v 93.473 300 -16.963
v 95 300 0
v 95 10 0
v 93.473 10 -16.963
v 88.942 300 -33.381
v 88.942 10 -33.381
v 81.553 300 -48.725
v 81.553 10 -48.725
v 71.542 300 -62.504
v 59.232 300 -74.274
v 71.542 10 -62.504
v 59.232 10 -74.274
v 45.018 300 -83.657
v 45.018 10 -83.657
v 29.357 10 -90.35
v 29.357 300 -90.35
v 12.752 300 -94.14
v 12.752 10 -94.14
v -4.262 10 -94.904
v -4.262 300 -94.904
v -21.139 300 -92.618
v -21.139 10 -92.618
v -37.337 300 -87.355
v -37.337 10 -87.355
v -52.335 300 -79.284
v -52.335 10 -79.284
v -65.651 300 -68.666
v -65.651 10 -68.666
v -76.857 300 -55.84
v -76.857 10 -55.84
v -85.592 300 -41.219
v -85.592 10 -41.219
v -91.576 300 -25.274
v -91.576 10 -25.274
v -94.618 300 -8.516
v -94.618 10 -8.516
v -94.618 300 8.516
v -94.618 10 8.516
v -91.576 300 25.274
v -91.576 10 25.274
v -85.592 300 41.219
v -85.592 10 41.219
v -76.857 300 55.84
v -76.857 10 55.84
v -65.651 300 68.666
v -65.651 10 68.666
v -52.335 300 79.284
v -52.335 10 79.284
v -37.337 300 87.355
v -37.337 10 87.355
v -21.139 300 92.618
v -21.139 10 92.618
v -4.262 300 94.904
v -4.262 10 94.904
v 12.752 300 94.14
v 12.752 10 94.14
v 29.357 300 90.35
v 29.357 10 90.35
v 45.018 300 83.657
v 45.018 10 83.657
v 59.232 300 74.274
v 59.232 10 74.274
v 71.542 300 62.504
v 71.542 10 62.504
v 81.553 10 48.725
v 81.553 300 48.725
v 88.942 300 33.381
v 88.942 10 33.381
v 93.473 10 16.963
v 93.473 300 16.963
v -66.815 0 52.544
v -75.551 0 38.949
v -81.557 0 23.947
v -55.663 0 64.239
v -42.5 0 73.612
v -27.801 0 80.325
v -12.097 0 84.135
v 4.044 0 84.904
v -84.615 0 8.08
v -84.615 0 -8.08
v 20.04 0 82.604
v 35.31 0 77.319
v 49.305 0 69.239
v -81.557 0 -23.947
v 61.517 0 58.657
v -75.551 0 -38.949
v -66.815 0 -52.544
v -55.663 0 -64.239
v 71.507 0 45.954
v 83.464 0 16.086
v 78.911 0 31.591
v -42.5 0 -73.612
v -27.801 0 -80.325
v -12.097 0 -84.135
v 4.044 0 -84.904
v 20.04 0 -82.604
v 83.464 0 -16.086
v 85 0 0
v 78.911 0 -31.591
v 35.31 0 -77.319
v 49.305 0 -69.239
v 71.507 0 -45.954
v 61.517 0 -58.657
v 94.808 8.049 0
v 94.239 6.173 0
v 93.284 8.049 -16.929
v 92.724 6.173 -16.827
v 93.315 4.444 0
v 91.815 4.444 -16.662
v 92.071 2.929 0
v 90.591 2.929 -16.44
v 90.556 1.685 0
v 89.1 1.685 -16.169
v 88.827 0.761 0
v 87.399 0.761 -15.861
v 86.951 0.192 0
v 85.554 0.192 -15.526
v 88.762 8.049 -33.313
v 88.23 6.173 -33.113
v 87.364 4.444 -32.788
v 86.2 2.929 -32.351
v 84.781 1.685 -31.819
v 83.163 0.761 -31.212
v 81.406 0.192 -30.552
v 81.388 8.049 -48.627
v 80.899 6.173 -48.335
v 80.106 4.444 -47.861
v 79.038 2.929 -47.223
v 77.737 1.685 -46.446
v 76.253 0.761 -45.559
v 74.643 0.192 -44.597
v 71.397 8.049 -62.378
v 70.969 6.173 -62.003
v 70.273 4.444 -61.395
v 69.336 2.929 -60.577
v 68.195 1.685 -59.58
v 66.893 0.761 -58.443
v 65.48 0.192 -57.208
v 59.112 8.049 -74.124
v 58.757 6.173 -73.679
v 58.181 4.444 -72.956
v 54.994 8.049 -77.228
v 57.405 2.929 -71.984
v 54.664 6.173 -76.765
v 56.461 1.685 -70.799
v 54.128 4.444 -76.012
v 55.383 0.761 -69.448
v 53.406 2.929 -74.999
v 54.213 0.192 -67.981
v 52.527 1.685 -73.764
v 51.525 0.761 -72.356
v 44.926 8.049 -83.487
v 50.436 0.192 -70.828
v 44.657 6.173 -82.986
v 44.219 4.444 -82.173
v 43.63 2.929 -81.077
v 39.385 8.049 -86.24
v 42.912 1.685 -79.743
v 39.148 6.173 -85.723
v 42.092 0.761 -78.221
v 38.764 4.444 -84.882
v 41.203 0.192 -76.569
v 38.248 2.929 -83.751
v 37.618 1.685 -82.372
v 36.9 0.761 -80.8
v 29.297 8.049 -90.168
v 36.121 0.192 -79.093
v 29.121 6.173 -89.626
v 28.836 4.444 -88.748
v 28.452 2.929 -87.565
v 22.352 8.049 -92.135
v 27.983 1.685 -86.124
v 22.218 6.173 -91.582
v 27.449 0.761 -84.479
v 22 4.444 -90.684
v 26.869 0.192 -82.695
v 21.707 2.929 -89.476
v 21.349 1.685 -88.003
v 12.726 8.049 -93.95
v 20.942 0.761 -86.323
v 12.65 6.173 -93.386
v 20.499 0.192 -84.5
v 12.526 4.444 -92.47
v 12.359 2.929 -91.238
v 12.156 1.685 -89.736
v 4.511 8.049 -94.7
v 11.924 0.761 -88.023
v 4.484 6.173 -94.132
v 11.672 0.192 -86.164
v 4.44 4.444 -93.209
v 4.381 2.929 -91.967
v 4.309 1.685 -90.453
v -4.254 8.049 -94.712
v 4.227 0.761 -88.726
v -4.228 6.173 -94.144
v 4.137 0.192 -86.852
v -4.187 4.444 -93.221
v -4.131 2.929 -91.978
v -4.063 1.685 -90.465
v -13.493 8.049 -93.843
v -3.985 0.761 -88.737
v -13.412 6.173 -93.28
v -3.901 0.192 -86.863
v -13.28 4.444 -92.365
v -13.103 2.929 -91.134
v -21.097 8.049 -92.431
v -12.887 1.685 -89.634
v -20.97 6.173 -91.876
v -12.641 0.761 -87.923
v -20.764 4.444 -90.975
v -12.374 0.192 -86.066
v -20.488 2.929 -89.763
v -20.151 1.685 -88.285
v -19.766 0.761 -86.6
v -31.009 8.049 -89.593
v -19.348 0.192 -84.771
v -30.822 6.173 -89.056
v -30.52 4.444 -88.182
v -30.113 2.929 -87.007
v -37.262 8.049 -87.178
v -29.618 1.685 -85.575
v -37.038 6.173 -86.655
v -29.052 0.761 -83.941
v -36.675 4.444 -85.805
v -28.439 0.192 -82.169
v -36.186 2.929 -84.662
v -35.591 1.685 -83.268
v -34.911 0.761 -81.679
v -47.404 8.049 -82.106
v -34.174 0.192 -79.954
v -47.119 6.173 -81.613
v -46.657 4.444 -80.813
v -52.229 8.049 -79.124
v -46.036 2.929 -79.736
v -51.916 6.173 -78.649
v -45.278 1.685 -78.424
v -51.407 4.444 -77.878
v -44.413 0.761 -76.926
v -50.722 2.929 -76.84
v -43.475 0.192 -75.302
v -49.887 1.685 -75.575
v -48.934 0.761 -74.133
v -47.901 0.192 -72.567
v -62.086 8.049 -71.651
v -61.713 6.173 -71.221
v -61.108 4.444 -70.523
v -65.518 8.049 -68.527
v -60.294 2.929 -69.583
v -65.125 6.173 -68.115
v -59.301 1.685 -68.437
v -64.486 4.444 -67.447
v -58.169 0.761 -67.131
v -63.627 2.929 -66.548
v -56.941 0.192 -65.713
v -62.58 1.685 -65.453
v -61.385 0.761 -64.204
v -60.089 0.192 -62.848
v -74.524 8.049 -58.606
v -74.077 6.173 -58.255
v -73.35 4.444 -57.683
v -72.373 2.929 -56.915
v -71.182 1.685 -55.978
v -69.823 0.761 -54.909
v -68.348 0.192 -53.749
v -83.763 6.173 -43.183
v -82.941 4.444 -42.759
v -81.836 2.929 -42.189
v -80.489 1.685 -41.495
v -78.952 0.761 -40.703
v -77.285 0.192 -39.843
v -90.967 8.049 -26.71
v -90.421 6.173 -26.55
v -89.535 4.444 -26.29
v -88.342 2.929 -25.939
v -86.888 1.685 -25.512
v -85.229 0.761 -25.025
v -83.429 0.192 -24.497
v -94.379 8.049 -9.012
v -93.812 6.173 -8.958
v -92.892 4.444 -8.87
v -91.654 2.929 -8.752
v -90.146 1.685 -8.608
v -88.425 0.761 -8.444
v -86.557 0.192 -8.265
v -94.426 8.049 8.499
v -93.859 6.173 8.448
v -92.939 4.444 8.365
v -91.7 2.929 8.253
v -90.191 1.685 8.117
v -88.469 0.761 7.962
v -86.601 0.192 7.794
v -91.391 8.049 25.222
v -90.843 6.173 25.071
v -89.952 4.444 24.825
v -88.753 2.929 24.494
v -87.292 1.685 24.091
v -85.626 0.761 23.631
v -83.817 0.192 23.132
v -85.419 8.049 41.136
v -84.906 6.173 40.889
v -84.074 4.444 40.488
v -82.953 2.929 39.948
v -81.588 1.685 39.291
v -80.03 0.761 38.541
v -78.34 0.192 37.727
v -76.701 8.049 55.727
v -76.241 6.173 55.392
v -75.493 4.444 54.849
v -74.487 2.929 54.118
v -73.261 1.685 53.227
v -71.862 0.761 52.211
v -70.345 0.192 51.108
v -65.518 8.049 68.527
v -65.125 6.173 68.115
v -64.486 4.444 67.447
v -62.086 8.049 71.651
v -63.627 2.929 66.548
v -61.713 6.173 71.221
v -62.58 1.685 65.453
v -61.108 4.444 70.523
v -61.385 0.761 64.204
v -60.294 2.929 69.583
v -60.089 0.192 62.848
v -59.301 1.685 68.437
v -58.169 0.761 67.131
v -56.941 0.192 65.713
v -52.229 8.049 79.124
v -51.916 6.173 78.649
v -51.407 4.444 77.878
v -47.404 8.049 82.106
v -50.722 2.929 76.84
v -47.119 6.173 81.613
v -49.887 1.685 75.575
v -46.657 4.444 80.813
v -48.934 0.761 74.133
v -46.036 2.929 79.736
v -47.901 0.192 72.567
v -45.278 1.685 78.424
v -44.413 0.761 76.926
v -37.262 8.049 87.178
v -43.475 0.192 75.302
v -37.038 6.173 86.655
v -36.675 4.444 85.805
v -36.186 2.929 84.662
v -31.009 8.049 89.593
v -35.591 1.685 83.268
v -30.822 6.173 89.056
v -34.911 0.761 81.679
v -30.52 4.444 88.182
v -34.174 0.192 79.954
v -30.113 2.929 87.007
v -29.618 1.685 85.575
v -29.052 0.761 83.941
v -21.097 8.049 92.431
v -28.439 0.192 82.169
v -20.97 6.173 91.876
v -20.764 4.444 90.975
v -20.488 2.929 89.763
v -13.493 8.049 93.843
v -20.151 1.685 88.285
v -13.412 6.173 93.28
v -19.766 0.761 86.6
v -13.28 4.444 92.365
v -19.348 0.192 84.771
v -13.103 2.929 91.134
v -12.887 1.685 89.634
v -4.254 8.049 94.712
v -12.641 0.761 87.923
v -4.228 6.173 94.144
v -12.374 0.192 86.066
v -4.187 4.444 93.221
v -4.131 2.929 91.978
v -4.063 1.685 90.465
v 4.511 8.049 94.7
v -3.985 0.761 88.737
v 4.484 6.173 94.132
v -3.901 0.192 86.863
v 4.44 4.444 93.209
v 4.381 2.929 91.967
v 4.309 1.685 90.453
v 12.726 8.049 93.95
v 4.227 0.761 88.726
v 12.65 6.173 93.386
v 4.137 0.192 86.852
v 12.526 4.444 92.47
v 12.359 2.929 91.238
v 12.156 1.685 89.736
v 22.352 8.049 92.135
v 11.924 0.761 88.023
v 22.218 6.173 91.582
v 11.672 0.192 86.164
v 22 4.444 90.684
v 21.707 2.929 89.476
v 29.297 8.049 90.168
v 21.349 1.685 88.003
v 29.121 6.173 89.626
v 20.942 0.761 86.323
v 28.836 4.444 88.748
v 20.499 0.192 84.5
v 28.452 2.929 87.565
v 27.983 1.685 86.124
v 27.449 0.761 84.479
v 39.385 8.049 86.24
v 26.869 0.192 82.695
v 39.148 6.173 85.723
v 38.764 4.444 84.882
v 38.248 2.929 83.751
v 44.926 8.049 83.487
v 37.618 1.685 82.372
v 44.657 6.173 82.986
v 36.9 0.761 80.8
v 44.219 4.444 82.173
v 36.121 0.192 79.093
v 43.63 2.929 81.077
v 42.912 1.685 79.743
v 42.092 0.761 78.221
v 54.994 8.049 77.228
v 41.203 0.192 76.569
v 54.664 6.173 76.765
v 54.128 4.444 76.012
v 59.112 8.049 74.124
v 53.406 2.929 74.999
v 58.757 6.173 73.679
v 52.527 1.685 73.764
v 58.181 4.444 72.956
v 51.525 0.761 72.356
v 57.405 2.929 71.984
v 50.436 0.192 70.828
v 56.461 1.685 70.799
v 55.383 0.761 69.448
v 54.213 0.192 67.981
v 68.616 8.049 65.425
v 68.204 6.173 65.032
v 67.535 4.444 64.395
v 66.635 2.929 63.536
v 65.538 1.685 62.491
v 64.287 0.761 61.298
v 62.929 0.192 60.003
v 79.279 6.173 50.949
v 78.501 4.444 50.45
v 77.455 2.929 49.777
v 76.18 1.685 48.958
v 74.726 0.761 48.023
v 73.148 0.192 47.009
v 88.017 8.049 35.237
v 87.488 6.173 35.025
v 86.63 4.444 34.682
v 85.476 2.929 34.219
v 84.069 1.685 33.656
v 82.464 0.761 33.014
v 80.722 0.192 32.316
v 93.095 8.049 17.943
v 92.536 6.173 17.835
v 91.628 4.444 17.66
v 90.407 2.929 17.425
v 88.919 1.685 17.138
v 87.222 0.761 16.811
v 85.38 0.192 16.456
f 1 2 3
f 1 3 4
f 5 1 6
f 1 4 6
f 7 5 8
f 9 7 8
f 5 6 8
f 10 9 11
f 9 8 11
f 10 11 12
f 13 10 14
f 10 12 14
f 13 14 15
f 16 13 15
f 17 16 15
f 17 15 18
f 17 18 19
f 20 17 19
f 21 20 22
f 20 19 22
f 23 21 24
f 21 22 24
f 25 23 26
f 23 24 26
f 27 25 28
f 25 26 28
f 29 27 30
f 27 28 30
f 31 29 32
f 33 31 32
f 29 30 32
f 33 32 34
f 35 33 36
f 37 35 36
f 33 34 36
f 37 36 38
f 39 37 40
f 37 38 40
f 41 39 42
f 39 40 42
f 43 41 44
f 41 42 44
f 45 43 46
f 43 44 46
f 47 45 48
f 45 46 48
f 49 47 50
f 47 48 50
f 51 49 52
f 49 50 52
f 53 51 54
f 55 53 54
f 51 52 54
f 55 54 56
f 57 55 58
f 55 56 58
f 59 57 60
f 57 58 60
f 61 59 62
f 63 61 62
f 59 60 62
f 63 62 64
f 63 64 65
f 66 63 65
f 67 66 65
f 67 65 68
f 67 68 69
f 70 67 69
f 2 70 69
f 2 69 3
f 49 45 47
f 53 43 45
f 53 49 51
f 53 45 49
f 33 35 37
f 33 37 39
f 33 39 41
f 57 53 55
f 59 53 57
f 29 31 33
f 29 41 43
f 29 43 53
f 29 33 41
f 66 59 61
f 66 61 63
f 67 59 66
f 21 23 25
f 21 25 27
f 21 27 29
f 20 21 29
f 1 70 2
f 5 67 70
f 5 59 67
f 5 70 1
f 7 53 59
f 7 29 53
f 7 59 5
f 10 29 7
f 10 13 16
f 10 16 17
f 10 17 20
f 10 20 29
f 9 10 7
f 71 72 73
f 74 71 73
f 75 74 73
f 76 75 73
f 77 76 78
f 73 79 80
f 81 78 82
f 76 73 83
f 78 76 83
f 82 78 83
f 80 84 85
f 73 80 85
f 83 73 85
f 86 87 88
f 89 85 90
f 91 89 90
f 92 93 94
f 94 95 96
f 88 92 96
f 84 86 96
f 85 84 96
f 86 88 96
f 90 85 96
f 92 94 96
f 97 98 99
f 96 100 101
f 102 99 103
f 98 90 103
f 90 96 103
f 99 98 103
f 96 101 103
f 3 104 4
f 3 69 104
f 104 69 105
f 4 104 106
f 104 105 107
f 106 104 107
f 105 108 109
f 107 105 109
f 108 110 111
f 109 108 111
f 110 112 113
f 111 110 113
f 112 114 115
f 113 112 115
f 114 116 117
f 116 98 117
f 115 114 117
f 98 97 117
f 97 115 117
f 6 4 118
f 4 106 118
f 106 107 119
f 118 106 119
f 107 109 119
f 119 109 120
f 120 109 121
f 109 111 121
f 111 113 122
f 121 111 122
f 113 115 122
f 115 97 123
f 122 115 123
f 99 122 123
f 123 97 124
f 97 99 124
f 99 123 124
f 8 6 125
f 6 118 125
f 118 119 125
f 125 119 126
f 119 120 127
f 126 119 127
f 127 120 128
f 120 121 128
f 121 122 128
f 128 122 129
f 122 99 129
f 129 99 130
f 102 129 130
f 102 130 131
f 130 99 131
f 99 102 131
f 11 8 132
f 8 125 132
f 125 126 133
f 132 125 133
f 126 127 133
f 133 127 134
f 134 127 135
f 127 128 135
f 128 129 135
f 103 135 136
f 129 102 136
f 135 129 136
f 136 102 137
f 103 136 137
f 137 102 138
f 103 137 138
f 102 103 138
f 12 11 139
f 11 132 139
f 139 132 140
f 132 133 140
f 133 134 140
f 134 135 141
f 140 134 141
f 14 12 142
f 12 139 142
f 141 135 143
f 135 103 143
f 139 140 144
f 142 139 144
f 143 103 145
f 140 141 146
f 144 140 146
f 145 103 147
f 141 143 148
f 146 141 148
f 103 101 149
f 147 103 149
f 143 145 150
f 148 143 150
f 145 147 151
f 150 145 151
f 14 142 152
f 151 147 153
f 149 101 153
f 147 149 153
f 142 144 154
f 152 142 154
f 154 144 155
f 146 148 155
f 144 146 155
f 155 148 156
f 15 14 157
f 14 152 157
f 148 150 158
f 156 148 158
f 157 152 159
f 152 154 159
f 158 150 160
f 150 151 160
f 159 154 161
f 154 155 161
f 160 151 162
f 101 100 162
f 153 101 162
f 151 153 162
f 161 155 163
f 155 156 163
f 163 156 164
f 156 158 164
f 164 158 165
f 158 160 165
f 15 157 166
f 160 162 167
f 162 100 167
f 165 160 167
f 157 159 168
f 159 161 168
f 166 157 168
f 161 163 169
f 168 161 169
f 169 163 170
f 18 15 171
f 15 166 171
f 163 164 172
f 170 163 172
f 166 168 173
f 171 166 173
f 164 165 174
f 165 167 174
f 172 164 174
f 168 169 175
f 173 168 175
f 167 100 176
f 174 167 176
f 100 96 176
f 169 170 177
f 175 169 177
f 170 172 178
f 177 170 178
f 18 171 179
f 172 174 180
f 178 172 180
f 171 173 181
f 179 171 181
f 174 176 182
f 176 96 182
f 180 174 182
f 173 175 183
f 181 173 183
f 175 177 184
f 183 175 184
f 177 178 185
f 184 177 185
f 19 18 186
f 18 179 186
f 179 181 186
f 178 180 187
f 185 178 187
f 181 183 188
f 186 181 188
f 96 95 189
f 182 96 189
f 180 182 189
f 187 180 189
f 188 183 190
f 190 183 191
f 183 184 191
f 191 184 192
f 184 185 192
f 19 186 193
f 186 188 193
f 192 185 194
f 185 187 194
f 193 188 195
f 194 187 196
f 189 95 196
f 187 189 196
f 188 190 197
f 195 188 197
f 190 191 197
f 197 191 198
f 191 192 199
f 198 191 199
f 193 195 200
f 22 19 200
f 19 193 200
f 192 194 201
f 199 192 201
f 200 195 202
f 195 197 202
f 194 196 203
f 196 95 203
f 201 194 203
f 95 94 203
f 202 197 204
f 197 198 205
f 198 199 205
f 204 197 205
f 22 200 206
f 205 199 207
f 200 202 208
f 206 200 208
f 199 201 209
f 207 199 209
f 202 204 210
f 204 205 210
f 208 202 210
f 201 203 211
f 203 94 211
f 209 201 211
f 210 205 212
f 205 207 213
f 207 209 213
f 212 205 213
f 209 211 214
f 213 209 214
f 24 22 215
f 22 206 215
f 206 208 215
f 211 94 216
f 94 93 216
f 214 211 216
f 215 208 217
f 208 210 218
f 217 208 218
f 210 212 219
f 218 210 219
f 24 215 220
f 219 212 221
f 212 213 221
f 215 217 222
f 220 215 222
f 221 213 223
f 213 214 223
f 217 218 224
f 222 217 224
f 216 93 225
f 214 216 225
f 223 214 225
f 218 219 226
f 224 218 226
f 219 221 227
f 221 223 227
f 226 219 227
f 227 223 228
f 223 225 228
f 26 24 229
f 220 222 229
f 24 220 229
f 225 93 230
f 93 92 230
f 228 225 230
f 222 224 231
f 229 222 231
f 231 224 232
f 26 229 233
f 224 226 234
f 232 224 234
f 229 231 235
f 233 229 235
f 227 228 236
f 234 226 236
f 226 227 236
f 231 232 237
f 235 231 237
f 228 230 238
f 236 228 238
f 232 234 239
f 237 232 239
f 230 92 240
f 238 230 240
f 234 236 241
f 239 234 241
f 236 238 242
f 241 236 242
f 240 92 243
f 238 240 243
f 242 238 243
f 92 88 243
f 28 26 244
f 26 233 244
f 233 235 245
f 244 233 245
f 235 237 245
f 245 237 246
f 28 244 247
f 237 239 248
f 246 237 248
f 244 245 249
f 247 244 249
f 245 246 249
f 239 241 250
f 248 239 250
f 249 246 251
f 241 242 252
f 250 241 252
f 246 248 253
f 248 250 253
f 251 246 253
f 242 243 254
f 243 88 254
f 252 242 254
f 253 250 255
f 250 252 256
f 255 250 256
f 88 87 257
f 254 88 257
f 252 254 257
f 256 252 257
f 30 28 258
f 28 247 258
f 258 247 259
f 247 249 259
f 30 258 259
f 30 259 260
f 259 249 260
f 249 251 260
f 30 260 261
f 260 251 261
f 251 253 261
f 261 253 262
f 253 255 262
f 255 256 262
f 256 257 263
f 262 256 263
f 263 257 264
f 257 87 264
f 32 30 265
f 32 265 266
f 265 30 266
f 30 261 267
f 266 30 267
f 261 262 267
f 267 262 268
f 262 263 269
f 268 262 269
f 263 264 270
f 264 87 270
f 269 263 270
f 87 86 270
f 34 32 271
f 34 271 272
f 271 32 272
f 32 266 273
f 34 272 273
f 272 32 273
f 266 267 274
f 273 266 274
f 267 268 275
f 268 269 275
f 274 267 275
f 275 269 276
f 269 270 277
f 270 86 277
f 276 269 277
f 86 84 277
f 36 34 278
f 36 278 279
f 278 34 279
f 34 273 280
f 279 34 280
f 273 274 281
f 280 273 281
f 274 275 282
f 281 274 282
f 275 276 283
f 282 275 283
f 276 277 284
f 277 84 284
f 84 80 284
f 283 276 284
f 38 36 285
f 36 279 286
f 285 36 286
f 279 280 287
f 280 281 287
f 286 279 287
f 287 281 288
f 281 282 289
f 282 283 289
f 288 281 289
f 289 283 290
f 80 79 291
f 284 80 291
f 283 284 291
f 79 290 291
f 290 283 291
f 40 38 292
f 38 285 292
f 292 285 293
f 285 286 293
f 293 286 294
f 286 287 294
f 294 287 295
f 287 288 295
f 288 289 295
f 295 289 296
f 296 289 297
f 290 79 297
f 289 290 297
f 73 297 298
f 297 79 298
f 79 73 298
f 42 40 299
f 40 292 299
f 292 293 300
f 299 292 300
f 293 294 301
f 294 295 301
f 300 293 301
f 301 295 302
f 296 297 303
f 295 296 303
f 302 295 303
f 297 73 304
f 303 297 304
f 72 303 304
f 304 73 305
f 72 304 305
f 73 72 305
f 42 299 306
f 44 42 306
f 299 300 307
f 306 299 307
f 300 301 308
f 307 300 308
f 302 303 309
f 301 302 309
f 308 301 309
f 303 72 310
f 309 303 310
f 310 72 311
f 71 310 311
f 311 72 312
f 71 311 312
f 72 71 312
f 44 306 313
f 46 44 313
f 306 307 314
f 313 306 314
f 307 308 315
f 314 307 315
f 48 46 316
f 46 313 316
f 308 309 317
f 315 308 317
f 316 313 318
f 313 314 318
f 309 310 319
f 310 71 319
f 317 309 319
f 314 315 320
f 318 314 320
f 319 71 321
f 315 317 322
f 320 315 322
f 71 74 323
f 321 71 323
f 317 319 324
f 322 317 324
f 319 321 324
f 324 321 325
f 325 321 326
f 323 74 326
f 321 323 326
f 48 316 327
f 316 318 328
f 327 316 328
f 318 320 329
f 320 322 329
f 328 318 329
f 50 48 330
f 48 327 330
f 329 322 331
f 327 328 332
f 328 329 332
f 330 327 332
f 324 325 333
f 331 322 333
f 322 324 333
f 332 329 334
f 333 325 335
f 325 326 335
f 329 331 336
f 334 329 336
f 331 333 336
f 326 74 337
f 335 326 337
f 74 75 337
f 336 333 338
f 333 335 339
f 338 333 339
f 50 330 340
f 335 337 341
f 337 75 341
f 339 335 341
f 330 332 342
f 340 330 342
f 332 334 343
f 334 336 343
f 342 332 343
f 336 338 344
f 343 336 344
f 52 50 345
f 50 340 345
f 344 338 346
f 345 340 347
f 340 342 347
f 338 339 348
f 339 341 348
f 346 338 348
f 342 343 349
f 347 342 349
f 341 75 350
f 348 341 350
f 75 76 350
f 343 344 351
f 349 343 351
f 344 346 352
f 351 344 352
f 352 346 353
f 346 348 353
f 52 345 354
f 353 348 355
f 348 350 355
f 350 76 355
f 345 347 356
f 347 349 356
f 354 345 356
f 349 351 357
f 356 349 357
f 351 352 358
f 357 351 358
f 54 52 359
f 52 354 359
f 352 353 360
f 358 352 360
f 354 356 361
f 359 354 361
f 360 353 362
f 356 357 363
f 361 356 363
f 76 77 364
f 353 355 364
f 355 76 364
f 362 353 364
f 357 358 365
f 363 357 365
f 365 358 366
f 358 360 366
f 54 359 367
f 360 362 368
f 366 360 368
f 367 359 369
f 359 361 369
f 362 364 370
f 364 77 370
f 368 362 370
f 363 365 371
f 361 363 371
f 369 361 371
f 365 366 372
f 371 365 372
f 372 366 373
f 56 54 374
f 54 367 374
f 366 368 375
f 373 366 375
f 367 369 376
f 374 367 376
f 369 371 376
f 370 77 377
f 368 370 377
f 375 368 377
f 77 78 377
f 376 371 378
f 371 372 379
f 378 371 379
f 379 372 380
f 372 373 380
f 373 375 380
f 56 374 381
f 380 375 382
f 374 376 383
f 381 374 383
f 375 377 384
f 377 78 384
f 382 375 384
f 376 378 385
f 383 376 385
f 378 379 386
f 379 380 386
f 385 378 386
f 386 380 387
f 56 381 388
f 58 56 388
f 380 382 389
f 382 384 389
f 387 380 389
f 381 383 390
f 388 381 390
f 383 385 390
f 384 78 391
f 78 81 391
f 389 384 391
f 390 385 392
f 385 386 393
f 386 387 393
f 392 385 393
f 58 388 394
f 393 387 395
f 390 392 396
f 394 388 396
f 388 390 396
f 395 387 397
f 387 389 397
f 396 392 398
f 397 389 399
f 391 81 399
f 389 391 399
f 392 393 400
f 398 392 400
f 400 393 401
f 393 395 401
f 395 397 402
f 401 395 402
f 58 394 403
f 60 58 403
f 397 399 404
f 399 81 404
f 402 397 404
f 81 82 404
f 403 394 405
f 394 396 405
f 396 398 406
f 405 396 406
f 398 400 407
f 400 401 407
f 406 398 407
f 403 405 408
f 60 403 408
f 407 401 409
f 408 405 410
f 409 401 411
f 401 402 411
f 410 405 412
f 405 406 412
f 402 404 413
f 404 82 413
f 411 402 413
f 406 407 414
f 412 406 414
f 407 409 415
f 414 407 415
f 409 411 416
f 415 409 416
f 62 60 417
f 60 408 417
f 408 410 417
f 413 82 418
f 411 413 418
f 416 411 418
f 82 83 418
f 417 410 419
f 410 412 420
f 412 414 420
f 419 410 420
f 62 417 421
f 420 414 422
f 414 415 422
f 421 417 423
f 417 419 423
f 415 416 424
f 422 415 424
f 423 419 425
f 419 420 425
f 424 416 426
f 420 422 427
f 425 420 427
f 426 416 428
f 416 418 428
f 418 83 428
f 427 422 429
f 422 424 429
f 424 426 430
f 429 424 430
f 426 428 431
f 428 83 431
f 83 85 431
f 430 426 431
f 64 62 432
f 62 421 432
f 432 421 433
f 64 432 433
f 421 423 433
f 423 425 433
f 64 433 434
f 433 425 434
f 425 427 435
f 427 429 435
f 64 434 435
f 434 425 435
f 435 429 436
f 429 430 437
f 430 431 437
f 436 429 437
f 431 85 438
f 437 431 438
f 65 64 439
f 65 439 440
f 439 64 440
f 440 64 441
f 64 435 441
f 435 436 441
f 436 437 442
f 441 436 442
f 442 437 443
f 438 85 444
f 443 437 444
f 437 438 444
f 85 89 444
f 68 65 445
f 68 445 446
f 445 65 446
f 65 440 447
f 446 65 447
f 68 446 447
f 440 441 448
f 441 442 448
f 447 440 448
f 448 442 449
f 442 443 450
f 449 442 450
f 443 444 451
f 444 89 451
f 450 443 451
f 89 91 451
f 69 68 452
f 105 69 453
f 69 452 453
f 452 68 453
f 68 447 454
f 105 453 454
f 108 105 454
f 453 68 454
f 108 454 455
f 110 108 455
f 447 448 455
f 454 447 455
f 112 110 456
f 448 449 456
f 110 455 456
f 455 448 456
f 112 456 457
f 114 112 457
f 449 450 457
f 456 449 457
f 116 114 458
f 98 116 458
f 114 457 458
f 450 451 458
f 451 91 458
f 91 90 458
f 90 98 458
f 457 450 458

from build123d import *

# Parameters (mm, degrees)
ESQUISSE1_R        = 9.5
BOSS_EXTRU_1_DEPTH = 30
CONG_1_R           = 1
ECHELLE1_SCALE     = 10


with BuildPart() as part:
    # Esquisse1 → Boss.-Extru.1 (new body)
    with BuildSketch(Plane(origin=(0, 0, 0), x_dir=(1, 0, 0), z_dir=(0, 1, 0))):
        Circle(ESQUISSE1_R)
    extrude(amount=BOSS_EXTRU_1_DEPTH)

    # Congé1
    cong_1_edges = [part.edges().sort_by_distance(p)[0] for p in [
        (-9.5, 0, 0),
    ]]
    fillet(cong_1_edges, radius=CONG_1_R)


with BuildPart() as part_1:
    # Echelle1: scaled about (0, 0, 0)
    add(part.part.scale(ECHELLE1_SCALE))


solid = part_1.part
